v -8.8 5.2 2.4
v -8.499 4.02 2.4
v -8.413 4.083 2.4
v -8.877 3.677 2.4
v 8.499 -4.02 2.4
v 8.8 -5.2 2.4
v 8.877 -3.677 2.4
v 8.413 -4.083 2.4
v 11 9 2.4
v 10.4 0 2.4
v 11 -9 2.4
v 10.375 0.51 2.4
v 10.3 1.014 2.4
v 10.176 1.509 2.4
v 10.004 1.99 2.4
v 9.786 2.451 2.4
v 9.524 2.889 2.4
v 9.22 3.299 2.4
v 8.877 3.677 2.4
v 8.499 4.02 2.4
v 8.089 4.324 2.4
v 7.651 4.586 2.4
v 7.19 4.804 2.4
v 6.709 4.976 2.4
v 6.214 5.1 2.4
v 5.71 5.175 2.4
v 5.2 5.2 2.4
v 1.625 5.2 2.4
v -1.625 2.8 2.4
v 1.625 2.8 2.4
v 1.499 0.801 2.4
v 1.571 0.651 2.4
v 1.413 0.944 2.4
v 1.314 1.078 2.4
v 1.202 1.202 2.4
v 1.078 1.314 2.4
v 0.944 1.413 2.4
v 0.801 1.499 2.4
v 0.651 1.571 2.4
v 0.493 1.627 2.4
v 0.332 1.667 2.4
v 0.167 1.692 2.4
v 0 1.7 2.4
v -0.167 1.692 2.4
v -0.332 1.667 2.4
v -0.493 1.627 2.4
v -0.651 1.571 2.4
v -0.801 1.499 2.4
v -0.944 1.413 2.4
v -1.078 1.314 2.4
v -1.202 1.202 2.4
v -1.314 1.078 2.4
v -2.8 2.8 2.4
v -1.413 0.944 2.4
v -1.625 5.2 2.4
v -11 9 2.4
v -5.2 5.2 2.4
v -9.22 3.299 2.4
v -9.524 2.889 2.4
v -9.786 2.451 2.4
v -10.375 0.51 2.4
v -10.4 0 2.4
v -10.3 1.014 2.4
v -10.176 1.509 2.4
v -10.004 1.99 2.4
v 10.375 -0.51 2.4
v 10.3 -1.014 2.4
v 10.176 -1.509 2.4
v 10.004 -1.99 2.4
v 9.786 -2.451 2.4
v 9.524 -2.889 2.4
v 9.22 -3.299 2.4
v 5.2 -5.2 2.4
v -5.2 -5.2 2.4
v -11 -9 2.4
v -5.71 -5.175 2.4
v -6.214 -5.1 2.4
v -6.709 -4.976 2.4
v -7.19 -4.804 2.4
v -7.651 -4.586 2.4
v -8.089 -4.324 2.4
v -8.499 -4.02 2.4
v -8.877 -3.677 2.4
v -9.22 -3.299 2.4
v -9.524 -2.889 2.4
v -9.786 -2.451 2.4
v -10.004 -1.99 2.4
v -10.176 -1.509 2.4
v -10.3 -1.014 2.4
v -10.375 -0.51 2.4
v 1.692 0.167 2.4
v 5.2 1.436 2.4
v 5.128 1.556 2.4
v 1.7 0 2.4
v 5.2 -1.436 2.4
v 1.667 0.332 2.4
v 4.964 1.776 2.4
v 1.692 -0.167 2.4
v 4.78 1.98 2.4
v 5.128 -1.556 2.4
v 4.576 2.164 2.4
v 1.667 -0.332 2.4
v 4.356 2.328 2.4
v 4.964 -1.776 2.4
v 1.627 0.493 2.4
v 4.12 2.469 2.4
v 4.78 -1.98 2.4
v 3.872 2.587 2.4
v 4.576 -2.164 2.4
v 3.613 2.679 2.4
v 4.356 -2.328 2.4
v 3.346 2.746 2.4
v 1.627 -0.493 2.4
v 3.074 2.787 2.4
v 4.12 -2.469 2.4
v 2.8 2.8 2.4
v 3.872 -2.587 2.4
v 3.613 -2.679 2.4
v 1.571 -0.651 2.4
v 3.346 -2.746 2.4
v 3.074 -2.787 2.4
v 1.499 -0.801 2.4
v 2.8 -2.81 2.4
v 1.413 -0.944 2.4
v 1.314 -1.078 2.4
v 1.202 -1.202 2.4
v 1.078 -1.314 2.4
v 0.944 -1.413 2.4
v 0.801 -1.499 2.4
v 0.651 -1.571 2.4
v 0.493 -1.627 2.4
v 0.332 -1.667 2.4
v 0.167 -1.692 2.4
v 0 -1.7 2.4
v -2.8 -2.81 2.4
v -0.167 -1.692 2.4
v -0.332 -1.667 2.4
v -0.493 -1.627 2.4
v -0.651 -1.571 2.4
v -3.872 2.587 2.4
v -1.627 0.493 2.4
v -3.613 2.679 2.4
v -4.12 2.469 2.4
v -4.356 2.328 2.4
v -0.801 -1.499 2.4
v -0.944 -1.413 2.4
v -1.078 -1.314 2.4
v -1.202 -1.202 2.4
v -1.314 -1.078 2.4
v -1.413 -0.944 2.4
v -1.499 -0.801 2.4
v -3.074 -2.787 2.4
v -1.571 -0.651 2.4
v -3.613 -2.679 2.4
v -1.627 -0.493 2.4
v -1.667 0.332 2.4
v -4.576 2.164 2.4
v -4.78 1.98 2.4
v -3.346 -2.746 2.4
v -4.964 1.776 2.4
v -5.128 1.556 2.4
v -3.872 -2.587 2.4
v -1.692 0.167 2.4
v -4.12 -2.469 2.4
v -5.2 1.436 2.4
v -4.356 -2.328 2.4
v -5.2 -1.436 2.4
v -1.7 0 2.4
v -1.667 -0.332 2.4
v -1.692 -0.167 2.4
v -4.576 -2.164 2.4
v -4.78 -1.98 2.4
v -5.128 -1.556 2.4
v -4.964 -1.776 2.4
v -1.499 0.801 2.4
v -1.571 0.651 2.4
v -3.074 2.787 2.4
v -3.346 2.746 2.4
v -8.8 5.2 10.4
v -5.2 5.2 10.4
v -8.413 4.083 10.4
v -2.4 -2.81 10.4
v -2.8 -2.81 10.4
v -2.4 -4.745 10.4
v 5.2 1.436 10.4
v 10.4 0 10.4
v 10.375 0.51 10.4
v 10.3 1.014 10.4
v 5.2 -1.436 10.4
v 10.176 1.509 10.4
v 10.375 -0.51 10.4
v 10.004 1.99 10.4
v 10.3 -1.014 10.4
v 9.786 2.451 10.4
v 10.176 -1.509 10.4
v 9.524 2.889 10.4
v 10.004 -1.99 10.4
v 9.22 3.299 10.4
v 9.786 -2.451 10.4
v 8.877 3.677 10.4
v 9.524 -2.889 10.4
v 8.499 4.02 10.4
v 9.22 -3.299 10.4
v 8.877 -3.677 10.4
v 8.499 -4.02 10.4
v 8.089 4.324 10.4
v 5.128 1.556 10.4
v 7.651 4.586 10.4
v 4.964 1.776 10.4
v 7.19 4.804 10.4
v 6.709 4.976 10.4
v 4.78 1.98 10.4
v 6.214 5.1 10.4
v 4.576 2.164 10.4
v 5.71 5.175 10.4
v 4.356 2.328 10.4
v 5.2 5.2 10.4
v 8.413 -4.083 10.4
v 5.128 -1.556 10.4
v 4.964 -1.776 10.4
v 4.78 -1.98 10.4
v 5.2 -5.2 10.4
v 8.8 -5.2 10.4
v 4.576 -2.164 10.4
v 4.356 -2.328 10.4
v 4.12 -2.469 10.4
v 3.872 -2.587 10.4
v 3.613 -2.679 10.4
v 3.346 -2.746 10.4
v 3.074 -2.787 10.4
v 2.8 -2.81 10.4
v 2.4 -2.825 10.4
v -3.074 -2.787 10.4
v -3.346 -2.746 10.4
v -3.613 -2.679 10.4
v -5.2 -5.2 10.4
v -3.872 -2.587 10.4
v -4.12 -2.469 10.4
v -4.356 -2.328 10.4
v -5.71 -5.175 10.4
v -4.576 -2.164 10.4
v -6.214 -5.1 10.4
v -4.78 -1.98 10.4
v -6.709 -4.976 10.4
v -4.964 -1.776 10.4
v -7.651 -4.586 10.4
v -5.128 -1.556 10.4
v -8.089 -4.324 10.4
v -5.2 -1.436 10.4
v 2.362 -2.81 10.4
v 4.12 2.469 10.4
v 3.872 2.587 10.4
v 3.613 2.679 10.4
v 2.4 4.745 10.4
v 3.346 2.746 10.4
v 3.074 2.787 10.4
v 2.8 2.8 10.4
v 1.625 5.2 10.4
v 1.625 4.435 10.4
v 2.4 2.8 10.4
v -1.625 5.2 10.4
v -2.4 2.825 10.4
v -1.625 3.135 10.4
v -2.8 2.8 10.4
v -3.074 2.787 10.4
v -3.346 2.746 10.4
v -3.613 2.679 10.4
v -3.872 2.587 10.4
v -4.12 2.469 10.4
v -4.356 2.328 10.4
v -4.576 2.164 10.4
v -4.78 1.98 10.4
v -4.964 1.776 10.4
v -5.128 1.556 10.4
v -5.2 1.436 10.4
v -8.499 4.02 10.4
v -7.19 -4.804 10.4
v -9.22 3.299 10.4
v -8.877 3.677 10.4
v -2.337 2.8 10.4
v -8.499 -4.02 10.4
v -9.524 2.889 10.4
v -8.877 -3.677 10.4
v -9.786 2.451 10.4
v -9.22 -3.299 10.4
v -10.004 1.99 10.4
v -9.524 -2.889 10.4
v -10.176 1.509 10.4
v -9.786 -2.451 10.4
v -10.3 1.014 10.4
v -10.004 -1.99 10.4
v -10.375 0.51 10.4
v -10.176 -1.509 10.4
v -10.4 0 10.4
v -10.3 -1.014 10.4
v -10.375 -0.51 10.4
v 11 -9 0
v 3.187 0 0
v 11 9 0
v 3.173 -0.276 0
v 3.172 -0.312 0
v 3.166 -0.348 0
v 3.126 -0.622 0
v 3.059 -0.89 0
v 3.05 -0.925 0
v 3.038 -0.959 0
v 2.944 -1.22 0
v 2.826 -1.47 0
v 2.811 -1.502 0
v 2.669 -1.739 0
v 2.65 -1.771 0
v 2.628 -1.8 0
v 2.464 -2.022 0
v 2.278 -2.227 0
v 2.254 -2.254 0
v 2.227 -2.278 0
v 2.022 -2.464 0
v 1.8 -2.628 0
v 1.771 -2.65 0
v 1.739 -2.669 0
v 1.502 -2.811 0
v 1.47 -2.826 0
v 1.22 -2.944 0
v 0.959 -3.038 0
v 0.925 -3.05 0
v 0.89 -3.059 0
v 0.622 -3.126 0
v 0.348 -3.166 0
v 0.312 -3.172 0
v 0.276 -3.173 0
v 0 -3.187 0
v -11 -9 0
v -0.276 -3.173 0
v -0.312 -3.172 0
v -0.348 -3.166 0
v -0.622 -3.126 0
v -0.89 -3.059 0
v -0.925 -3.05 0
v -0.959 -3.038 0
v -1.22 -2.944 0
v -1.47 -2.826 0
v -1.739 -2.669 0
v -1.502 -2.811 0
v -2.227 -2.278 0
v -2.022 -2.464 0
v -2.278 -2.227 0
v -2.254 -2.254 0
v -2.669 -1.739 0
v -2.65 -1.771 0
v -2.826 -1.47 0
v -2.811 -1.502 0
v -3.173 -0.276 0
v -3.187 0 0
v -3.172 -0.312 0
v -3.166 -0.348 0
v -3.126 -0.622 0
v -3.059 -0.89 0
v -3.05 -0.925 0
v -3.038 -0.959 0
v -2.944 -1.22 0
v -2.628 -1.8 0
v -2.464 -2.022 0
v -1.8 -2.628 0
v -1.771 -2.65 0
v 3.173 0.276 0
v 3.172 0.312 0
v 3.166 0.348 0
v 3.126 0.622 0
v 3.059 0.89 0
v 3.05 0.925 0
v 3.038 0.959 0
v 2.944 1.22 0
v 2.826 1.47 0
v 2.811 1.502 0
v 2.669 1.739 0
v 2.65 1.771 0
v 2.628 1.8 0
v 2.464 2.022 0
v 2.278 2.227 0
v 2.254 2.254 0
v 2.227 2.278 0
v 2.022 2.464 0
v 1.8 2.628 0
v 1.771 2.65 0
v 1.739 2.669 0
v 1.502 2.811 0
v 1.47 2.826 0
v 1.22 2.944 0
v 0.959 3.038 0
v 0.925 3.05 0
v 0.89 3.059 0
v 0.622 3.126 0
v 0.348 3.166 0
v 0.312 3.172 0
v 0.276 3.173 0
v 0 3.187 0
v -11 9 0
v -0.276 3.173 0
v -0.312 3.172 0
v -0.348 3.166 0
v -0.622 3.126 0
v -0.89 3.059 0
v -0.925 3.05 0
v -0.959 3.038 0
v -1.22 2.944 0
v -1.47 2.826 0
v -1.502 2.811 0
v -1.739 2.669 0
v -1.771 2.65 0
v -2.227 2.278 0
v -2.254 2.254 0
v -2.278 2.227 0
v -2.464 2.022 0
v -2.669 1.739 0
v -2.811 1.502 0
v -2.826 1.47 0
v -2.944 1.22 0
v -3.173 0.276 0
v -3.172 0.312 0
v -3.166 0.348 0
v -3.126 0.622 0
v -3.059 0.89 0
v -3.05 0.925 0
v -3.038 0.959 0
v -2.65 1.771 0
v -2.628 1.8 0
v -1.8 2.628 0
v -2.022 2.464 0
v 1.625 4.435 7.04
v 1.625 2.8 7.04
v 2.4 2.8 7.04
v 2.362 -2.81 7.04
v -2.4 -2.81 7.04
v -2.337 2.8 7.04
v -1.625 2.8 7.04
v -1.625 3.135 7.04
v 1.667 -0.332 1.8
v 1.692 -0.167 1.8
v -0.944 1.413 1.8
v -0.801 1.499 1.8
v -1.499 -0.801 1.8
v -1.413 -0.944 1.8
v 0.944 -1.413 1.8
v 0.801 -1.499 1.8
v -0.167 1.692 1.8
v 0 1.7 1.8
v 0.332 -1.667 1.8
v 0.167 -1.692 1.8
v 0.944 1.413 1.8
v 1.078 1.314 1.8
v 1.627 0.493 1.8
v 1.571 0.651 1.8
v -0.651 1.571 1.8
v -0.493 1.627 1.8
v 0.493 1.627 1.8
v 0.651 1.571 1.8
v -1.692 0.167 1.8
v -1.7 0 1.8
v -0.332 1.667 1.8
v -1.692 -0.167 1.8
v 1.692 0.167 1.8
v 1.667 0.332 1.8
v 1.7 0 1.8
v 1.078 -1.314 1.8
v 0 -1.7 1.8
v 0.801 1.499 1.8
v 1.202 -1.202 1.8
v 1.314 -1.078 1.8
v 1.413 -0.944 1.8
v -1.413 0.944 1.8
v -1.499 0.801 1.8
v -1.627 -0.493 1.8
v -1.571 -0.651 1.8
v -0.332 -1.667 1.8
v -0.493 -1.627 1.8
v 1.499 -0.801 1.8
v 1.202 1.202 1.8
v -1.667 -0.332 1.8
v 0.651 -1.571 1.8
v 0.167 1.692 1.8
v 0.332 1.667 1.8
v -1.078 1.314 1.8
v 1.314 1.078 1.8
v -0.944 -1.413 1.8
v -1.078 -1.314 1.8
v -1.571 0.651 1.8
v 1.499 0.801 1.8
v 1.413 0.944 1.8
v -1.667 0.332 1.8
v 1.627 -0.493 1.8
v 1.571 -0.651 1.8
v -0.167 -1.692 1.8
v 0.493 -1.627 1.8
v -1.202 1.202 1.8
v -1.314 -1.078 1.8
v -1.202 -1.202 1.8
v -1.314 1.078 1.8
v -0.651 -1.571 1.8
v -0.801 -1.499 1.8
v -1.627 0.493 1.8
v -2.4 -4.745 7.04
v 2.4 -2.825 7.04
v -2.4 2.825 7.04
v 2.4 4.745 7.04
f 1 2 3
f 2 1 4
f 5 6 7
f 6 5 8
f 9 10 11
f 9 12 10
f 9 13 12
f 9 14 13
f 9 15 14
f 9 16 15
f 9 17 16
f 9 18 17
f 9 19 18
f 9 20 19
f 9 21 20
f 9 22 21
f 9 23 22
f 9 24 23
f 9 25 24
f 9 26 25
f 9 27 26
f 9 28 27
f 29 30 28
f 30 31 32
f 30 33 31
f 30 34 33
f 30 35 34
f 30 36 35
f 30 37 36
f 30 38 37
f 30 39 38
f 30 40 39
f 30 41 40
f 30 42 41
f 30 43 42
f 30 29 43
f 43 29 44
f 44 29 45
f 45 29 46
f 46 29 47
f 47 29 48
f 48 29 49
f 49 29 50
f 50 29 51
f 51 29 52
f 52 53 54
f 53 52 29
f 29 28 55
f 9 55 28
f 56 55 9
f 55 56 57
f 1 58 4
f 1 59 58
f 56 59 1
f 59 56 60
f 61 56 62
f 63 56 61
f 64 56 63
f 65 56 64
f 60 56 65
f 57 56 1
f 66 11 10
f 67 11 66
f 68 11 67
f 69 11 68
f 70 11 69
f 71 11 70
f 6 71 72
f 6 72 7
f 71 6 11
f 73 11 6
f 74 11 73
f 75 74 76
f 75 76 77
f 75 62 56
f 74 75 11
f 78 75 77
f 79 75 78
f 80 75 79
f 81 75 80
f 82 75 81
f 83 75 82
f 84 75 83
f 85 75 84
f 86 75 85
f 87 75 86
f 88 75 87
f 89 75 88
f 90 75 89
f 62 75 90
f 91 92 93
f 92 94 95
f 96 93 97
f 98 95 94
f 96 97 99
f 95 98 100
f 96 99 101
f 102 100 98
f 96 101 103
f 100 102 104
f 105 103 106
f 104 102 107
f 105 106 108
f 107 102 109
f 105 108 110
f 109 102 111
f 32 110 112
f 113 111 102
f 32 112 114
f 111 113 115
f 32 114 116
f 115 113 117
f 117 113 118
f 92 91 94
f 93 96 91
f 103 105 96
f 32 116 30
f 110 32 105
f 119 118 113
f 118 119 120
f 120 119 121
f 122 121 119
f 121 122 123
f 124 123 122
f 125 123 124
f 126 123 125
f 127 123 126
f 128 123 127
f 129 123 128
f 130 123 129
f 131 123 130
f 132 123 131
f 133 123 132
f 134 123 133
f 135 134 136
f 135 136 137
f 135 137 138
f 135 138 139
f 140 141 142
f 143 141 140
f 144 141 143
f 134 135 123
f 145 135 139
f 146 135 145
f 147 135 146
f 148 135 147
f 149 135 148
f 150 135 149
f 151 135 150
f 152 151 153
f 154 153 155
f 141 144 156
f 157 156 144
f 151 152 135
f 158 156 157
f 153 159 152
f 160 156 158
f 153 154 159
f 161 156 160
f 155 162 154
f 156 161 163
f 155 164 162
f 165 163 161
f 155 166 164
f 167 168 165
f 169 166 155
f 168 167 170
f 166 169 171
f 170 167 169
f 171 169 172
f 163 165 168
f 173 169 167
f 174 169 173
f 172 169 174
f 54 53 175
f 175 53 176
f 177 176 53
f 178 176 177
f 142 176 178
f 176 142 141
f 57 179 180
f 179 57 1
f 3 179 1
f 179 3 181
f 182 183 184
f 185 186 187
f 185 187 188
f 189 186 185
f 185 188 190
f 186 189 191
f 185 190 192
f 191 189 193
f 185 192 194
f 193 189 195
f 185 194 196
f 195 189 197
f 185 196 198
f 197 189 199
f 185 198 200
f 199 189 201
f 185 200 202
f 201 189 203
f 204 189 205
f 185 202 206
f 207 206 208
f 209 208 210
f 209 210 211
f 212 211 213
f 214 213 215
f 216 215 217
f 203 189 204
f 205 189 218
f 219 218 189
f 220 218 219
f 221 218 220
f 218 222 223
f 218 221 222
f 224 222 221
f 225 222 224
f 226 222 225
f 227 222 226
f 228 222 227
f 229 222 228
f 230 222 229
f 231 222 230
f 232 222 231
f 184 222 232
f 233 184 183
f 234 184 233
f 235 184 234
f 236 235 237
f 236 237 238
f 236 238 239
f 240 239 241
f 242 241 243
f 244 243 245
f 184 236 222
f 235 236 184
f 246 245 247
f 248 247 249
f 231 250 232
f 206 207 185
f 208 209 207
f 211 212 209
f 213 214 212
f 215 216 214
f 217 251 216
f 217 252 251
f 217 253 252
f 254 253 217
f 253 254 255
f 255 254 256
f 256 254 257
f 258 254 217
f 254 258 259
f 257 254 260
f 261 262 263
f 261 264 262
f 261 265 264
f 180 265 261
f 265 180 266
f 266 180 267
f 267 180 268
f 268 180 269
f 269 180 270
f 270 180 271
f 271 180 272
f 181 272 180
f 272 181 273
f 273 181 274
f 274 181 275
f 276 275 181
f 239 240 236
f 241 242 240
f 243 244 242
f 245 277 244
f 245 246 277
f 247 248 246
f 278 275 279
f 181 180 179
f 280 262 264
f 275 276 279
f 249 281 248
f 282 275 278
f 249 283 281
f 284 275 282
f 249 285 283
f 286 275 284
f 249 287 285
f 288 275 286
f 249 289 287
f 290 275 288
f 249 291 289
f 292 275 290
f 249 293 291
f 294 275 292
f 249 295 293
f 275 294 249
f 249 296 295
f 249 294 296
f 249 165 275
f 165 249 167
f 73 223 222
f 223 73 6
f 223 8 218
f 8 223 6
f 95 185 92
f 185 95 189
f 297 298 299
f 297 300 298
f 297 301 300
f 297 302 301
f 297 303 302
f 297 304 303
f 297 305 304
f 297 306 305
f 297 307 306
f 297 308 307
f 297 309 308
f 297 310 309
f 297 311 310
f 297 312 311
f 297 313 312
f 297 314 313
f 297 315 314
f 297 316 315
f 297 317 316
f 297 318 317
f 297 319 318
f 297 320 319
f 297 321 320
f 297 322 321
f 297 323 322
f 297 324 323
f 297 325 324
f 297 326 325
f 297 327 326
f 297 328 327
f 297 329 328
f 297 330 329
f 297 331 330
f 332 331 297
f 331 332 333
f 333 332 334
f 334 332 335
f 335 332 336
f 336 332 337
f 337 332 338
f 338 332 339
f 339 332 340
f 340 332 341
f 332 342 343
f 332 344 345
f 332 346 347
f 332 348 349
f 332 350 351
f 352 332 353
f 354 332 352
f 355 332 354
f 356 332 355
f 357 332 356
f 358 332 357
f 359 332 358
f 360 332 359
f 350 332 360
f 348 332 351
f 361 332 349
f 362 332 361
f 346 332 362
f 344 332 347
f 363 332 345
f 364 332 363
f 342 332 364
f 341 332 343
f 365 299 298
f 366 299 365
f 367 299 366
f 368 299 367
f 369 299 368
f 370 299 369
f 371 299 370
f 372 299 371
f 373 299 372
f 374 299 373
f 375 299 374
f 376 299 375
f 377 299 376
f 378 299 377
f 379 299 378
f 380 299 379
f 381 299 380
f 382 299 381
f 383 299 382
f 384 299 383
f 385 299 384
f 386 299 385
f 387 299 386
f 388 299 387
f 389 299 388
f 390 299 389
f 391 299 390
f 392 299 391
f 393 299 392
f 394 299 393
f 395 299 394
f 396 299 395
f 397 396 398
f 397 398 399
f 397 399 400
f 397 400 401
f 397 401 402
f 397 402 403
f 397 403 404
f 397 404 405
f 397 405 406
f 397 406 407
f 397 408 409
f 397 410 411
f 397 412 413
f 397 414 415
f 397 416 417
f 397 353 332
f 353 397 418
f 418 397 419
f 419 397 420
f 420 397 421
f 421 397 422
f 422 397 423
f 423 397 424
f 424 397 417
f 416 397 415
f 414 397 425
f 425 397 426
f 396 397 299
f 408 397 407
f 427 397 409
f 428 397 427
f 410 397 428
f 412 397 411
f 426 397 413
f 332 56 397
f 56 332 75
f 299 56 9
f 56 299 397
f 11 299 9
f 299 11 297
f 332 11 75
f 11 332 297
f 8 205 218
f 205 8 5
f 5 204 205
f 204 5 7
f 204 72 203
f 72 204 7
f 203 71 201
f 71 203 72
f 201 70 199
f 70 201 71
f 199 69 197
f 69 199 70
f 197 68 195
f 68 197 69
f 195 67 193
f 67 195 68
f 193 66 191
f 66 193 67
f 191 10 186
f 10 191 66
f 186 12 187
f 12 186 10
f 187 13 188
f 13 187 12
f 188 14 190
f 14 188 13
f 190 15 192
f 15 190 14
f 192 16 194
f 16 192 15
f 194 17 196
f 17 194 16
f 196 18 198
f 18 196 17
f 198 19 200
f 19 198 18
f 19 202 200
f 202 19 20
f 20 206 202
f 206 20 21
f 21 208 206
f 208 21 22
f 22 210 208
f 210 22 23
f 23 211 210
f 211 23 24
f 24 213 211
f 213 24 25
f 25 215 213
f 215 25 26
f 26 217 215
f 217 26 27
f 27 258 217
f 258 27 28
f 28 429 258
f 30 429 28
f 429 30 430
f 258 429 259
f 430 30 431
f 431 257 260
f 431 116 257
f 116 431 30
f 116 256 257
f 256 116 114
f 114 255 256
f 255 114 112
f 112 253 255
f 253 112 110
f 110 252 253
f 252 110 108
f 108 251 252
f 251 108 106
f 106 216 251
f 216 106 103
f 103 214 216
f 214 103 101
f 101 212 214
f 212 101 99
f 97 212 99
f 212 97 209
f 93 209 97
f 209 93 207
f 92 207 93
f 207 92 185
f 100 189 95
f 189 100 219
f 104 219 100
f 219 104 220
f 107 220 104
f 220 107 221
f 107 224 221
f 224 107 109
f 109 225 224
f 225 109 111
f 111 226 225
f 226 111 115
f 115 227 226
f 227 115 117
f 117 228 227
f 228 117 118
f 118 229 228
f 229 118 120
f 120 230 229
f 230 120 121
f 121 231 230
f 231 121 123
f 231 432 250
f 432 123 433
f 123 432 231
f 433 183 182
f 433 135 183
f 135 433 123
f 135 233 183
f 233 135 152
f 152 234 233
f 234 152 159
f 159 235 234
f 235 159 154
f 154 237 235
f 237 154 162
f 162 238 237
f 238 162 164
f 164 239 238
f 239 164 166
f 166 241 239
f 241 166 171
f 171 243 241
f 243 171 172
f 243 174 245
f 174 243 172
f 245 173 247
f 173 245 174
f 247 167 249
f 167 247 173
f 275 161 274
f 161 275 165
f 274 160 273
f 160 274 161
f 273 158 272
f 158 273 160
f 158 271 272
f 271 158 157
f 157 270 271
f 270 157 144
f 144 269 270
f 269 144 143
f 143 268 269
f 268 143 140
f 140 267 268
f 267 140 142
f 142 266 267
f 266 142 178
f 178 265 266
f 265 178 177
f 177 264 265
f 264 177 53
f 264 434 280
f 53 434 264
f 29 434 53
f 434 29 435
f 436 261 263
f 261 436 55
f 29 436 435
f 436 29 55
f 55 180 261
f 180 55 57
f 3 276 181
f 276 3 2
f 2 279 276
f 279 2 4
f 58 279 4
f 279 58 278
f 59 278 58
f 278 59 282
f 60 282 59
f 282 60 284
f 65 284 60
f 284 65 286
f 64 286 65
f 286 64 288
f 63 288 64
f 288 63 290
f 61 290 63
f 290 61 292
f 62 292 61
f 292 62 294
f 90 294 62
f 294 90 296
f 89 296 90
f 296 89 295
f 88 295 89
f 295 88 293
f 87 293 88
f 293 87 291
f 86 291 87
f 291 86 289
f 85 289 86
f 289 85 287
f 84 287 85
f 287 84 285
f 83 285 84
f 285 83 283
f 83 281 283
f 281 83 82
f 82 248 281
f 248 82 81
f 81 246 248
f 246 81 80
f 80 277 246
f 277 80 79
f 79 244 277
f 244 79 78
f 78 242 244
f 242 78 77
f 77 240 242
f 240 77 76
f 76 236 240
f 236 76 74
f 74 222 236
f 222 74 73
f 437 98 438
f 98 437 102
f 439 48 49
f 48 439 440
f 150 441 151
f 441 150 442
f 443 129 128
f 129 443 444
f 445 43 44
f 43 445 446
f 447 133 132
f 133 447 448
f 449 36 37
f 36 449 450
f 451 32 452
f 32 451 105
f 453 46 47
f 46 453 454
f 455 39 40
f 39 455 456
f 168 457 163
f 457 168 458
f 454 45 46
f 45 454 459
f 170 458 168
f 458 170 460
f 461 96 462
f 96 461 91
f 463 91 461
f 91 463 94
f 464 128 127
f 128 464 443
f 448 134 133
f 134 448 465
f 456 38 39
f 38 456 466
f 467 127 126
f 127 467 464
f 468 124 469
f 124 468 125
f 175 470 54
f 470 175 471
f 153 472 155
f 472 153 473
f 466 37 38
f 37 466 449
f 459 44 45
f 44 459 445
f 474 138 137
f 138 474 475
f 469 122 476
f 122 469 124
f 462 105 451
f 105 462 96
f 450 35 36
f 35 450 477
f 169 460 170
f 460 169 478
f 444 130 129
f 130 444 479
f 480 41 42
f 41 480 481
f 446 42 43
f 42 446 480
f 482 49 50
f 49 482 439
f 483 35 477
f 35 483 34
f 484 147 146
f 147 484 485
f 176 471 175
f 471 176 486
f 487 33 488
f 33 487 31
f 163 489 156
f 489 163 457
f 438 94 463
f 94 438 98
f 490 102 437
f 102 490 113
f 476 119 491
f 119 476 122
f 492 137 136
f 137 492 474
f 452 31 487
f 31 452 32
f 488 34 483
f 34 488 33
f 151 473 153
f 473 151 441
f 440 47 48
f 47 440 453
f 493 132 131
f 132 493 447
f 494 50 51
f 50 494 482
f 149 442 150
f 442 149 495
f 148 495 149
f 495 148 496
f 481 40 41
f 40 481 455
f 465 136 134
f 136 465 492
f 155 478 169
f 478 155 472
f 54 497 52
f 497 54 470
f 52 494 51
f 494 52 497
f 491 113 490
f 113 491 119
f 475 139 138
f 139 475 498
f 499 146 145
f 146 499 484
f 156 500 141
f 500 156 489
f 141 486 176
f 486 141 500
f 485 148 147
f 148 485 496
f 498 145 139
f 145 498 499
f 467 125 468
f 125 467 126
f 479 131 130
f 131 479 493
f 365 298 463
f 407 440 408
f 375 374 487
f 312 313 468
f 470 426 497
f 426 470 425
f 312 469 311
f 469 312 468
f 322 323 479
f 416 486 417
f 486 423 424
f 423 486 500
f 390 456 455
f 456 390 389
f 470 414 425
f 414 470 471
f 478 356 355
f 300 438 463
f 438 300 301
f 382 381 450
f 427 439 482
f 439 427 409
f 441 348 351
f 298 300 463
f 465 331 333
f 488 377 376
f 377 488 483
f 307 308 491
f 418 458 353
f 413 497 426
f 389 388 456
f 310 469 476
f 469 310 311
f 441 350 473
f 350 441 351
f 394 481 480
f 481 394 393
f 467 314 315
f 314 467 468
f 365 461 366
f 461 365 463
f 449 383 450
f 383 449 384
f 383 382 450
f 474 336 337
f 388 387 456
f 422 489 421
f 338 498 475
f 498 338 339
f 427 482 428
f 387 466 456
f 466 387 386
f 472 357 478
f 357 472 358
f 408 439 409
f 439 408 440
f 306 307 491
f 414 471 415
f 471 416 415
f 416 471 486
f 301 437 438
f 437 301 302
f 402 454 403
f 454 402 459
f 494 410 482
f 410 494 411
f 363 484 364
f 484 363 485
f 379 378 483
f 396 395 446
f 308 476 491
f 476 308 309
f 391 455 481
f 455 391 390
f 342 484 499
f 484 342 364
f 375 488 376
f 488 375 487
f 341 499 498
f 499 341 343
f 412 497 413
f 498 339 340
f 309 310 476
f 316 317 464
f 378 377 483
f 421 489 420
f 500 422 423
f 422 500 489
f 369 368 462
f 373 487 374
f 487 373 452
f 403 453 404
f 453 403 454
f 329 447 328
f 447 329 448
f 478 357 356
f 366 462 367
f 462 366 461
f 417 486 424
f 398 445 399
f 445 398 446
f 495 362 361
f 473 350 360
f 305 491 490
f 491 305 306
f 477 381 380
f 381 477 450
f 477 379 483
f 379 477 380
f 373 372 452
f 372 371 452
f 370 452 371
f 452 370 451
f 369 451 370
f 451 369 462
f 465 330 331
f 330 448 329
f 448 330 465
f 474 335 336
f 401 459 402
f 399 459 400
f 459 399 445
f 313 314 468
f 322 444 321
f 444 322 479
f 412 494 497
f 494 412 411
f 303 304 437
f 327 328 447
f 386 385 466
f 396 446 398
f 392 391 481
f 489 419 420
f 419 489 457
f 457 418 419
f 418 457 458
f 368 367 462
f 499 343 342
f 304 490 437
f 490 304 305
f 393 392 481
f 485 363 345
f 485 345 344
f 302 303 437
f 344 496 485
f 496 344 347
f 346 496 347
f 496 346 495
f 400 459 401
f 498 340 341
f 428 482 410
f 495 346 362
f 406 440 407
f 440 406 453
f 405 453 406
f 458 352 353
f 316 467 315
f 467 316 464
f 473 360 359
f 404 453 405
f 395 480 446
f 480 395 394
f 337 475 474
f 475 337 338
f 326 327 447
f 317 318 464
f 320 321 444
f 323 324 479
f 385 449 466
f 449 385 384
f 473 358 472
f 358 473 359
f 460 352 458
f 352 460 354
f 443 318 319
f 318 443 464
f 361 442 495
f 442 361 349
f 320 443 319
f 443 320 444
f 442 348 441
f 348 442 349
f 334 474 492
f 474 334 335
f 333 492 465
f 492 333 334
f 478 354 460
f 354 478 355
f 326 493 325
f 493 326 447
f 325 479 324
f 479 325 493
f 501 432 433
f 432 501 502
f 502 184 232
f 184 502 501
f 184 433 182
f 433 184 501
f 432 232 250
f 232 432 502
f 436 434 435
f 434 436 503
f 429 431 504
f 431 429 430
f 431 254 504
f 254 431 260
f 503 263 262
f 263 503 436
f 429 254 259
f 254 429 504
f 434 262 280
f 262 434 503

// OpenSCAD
/* [Dimensions] */
// Cable diameter to clip
cable_dia = 5; // [2:0.5:15]
// Wall thickness of the clip body
wall = 2.4; // [1.2:0.4:4]
// Base width (mounting flange)
base_width = 18; // [10:0.5:30]
// Base length (mounting flange)
base_length = 22; // [12:0.5:40]
// Height of the clip arch above the base
arch_height = 8; // [4:0.5:16]
// Gap width for cable entry (auto if 0)
entry_gap = 0; // [0:0.2:8]

/* [Screw] */
// Screw head diameter (M3 countersunk)
screw_head_dia = 6.2; // [4:0.1:10]
// Screw head height (countersink depth)
screw_head_depth = 1.8; // [1:0.1:4]
// Screw shank diameter (with clearance)
screw_shank_dia = 3.4; // [2.5:0.1:6]

/* [Options] */
// Add chamfer to entry edges for easier snap
entry_chamfer = true;

/* [Hidden] */
$fn = 64;

// Derived values
inner_r = cable_dia / 2 + 0.3; // sliding fit for cable
outer_r = inner_r + wall;
gap = entry_gap > 0 ? entry_gap : cable_dia * 0.65; // auto gap if not specified
total_height = arch_height + wall;

// Check minimum wall
assert(wall >= 1.2, "Wall must be >= 1.2mm");
assert(gap < inner_r * 2, "Gap must be smaller than cable diameter");

module cable_clip() {
    difference() {
        union() {
            // Base plate
            linear_extrude(wall)
                translate([-base_length/2, -base_width/2])
                    square([base_length, base_width]);
            
            // Arch body (hull of two circles for clean outer shape)
            translate([0, 0, wall])
            linear_extrude(arch_height)
                difference() {
                    // Outer shape: two circles with rectangle between
                    hull() {
                        translate([-outer_r, 0]) circle(r = outer_r);
                        translate([outer_r, 0]) circle(r = outer_r);
                        translate([-outer_r, -outer_r]) square([outer_r*2, outer_r*2]);
                    }
                    // Inner cutout
                    hull() {
                        translate([-inner_r, 0]) circle(r = inner_r);
                        translate([inner_r, 0]) circle(r = inner_r);
                        translate([-inner_r, -inner_r-0.01]) square([inner_r*2, inner_r*2+0.01]);
                    }
                    // Entry gap at top
                    translate([-gap/2, 0]) square([gap, outer_r + 1]);
                }
            
            // Fillet transition from base to arch
            for (mx = [-1, 1]) {
                translate([mx * outer_r, 0, wall])
                    rotate([0, 0, mx > 0 ? 0 : 180])
                        linear_extrude(arch_height)
                            polygon([
                                [0, -outer_r],
                                [wall*1.5, -outer_r],
                                [0, outer_r]
                            ]);
            }
        }
        
        // Countersunk screw hole (centered on base)
        translate([0, 0, -0.5]) {
            // Shank hole through everything
            cylinder(h = total_height + 1, d = screw_shank_dia);
            // Countersink in base bottom
            cylinder(h = screw_head_depth + 0.5, d1 = screw_head_dia + 1, d2 = screw_shank_dia);
        }
        
        // Entry chamfer cuts (optional, for easier cable snap)
        if (entry_chamfer) {
            chamfer_size = wall * 0.8;
            for (my = [-1, 1]) {
                translate([0, my * (gap/2 + wall/2), total_height - chamfer_size/2])
                    rotate([0, 0, my > 0 ? 90 : -90])
                        linear_extrude(wall*2, center = true)
                            polygon([
                                [-chamfer_size, -wall],
                                [chamfer_size, -wall],
                                [0, wall]
                            ]);
            }
        }
    }
}

// Orient for printing: flat on XY plane, arch opening up (already correct)
cable_clip();
